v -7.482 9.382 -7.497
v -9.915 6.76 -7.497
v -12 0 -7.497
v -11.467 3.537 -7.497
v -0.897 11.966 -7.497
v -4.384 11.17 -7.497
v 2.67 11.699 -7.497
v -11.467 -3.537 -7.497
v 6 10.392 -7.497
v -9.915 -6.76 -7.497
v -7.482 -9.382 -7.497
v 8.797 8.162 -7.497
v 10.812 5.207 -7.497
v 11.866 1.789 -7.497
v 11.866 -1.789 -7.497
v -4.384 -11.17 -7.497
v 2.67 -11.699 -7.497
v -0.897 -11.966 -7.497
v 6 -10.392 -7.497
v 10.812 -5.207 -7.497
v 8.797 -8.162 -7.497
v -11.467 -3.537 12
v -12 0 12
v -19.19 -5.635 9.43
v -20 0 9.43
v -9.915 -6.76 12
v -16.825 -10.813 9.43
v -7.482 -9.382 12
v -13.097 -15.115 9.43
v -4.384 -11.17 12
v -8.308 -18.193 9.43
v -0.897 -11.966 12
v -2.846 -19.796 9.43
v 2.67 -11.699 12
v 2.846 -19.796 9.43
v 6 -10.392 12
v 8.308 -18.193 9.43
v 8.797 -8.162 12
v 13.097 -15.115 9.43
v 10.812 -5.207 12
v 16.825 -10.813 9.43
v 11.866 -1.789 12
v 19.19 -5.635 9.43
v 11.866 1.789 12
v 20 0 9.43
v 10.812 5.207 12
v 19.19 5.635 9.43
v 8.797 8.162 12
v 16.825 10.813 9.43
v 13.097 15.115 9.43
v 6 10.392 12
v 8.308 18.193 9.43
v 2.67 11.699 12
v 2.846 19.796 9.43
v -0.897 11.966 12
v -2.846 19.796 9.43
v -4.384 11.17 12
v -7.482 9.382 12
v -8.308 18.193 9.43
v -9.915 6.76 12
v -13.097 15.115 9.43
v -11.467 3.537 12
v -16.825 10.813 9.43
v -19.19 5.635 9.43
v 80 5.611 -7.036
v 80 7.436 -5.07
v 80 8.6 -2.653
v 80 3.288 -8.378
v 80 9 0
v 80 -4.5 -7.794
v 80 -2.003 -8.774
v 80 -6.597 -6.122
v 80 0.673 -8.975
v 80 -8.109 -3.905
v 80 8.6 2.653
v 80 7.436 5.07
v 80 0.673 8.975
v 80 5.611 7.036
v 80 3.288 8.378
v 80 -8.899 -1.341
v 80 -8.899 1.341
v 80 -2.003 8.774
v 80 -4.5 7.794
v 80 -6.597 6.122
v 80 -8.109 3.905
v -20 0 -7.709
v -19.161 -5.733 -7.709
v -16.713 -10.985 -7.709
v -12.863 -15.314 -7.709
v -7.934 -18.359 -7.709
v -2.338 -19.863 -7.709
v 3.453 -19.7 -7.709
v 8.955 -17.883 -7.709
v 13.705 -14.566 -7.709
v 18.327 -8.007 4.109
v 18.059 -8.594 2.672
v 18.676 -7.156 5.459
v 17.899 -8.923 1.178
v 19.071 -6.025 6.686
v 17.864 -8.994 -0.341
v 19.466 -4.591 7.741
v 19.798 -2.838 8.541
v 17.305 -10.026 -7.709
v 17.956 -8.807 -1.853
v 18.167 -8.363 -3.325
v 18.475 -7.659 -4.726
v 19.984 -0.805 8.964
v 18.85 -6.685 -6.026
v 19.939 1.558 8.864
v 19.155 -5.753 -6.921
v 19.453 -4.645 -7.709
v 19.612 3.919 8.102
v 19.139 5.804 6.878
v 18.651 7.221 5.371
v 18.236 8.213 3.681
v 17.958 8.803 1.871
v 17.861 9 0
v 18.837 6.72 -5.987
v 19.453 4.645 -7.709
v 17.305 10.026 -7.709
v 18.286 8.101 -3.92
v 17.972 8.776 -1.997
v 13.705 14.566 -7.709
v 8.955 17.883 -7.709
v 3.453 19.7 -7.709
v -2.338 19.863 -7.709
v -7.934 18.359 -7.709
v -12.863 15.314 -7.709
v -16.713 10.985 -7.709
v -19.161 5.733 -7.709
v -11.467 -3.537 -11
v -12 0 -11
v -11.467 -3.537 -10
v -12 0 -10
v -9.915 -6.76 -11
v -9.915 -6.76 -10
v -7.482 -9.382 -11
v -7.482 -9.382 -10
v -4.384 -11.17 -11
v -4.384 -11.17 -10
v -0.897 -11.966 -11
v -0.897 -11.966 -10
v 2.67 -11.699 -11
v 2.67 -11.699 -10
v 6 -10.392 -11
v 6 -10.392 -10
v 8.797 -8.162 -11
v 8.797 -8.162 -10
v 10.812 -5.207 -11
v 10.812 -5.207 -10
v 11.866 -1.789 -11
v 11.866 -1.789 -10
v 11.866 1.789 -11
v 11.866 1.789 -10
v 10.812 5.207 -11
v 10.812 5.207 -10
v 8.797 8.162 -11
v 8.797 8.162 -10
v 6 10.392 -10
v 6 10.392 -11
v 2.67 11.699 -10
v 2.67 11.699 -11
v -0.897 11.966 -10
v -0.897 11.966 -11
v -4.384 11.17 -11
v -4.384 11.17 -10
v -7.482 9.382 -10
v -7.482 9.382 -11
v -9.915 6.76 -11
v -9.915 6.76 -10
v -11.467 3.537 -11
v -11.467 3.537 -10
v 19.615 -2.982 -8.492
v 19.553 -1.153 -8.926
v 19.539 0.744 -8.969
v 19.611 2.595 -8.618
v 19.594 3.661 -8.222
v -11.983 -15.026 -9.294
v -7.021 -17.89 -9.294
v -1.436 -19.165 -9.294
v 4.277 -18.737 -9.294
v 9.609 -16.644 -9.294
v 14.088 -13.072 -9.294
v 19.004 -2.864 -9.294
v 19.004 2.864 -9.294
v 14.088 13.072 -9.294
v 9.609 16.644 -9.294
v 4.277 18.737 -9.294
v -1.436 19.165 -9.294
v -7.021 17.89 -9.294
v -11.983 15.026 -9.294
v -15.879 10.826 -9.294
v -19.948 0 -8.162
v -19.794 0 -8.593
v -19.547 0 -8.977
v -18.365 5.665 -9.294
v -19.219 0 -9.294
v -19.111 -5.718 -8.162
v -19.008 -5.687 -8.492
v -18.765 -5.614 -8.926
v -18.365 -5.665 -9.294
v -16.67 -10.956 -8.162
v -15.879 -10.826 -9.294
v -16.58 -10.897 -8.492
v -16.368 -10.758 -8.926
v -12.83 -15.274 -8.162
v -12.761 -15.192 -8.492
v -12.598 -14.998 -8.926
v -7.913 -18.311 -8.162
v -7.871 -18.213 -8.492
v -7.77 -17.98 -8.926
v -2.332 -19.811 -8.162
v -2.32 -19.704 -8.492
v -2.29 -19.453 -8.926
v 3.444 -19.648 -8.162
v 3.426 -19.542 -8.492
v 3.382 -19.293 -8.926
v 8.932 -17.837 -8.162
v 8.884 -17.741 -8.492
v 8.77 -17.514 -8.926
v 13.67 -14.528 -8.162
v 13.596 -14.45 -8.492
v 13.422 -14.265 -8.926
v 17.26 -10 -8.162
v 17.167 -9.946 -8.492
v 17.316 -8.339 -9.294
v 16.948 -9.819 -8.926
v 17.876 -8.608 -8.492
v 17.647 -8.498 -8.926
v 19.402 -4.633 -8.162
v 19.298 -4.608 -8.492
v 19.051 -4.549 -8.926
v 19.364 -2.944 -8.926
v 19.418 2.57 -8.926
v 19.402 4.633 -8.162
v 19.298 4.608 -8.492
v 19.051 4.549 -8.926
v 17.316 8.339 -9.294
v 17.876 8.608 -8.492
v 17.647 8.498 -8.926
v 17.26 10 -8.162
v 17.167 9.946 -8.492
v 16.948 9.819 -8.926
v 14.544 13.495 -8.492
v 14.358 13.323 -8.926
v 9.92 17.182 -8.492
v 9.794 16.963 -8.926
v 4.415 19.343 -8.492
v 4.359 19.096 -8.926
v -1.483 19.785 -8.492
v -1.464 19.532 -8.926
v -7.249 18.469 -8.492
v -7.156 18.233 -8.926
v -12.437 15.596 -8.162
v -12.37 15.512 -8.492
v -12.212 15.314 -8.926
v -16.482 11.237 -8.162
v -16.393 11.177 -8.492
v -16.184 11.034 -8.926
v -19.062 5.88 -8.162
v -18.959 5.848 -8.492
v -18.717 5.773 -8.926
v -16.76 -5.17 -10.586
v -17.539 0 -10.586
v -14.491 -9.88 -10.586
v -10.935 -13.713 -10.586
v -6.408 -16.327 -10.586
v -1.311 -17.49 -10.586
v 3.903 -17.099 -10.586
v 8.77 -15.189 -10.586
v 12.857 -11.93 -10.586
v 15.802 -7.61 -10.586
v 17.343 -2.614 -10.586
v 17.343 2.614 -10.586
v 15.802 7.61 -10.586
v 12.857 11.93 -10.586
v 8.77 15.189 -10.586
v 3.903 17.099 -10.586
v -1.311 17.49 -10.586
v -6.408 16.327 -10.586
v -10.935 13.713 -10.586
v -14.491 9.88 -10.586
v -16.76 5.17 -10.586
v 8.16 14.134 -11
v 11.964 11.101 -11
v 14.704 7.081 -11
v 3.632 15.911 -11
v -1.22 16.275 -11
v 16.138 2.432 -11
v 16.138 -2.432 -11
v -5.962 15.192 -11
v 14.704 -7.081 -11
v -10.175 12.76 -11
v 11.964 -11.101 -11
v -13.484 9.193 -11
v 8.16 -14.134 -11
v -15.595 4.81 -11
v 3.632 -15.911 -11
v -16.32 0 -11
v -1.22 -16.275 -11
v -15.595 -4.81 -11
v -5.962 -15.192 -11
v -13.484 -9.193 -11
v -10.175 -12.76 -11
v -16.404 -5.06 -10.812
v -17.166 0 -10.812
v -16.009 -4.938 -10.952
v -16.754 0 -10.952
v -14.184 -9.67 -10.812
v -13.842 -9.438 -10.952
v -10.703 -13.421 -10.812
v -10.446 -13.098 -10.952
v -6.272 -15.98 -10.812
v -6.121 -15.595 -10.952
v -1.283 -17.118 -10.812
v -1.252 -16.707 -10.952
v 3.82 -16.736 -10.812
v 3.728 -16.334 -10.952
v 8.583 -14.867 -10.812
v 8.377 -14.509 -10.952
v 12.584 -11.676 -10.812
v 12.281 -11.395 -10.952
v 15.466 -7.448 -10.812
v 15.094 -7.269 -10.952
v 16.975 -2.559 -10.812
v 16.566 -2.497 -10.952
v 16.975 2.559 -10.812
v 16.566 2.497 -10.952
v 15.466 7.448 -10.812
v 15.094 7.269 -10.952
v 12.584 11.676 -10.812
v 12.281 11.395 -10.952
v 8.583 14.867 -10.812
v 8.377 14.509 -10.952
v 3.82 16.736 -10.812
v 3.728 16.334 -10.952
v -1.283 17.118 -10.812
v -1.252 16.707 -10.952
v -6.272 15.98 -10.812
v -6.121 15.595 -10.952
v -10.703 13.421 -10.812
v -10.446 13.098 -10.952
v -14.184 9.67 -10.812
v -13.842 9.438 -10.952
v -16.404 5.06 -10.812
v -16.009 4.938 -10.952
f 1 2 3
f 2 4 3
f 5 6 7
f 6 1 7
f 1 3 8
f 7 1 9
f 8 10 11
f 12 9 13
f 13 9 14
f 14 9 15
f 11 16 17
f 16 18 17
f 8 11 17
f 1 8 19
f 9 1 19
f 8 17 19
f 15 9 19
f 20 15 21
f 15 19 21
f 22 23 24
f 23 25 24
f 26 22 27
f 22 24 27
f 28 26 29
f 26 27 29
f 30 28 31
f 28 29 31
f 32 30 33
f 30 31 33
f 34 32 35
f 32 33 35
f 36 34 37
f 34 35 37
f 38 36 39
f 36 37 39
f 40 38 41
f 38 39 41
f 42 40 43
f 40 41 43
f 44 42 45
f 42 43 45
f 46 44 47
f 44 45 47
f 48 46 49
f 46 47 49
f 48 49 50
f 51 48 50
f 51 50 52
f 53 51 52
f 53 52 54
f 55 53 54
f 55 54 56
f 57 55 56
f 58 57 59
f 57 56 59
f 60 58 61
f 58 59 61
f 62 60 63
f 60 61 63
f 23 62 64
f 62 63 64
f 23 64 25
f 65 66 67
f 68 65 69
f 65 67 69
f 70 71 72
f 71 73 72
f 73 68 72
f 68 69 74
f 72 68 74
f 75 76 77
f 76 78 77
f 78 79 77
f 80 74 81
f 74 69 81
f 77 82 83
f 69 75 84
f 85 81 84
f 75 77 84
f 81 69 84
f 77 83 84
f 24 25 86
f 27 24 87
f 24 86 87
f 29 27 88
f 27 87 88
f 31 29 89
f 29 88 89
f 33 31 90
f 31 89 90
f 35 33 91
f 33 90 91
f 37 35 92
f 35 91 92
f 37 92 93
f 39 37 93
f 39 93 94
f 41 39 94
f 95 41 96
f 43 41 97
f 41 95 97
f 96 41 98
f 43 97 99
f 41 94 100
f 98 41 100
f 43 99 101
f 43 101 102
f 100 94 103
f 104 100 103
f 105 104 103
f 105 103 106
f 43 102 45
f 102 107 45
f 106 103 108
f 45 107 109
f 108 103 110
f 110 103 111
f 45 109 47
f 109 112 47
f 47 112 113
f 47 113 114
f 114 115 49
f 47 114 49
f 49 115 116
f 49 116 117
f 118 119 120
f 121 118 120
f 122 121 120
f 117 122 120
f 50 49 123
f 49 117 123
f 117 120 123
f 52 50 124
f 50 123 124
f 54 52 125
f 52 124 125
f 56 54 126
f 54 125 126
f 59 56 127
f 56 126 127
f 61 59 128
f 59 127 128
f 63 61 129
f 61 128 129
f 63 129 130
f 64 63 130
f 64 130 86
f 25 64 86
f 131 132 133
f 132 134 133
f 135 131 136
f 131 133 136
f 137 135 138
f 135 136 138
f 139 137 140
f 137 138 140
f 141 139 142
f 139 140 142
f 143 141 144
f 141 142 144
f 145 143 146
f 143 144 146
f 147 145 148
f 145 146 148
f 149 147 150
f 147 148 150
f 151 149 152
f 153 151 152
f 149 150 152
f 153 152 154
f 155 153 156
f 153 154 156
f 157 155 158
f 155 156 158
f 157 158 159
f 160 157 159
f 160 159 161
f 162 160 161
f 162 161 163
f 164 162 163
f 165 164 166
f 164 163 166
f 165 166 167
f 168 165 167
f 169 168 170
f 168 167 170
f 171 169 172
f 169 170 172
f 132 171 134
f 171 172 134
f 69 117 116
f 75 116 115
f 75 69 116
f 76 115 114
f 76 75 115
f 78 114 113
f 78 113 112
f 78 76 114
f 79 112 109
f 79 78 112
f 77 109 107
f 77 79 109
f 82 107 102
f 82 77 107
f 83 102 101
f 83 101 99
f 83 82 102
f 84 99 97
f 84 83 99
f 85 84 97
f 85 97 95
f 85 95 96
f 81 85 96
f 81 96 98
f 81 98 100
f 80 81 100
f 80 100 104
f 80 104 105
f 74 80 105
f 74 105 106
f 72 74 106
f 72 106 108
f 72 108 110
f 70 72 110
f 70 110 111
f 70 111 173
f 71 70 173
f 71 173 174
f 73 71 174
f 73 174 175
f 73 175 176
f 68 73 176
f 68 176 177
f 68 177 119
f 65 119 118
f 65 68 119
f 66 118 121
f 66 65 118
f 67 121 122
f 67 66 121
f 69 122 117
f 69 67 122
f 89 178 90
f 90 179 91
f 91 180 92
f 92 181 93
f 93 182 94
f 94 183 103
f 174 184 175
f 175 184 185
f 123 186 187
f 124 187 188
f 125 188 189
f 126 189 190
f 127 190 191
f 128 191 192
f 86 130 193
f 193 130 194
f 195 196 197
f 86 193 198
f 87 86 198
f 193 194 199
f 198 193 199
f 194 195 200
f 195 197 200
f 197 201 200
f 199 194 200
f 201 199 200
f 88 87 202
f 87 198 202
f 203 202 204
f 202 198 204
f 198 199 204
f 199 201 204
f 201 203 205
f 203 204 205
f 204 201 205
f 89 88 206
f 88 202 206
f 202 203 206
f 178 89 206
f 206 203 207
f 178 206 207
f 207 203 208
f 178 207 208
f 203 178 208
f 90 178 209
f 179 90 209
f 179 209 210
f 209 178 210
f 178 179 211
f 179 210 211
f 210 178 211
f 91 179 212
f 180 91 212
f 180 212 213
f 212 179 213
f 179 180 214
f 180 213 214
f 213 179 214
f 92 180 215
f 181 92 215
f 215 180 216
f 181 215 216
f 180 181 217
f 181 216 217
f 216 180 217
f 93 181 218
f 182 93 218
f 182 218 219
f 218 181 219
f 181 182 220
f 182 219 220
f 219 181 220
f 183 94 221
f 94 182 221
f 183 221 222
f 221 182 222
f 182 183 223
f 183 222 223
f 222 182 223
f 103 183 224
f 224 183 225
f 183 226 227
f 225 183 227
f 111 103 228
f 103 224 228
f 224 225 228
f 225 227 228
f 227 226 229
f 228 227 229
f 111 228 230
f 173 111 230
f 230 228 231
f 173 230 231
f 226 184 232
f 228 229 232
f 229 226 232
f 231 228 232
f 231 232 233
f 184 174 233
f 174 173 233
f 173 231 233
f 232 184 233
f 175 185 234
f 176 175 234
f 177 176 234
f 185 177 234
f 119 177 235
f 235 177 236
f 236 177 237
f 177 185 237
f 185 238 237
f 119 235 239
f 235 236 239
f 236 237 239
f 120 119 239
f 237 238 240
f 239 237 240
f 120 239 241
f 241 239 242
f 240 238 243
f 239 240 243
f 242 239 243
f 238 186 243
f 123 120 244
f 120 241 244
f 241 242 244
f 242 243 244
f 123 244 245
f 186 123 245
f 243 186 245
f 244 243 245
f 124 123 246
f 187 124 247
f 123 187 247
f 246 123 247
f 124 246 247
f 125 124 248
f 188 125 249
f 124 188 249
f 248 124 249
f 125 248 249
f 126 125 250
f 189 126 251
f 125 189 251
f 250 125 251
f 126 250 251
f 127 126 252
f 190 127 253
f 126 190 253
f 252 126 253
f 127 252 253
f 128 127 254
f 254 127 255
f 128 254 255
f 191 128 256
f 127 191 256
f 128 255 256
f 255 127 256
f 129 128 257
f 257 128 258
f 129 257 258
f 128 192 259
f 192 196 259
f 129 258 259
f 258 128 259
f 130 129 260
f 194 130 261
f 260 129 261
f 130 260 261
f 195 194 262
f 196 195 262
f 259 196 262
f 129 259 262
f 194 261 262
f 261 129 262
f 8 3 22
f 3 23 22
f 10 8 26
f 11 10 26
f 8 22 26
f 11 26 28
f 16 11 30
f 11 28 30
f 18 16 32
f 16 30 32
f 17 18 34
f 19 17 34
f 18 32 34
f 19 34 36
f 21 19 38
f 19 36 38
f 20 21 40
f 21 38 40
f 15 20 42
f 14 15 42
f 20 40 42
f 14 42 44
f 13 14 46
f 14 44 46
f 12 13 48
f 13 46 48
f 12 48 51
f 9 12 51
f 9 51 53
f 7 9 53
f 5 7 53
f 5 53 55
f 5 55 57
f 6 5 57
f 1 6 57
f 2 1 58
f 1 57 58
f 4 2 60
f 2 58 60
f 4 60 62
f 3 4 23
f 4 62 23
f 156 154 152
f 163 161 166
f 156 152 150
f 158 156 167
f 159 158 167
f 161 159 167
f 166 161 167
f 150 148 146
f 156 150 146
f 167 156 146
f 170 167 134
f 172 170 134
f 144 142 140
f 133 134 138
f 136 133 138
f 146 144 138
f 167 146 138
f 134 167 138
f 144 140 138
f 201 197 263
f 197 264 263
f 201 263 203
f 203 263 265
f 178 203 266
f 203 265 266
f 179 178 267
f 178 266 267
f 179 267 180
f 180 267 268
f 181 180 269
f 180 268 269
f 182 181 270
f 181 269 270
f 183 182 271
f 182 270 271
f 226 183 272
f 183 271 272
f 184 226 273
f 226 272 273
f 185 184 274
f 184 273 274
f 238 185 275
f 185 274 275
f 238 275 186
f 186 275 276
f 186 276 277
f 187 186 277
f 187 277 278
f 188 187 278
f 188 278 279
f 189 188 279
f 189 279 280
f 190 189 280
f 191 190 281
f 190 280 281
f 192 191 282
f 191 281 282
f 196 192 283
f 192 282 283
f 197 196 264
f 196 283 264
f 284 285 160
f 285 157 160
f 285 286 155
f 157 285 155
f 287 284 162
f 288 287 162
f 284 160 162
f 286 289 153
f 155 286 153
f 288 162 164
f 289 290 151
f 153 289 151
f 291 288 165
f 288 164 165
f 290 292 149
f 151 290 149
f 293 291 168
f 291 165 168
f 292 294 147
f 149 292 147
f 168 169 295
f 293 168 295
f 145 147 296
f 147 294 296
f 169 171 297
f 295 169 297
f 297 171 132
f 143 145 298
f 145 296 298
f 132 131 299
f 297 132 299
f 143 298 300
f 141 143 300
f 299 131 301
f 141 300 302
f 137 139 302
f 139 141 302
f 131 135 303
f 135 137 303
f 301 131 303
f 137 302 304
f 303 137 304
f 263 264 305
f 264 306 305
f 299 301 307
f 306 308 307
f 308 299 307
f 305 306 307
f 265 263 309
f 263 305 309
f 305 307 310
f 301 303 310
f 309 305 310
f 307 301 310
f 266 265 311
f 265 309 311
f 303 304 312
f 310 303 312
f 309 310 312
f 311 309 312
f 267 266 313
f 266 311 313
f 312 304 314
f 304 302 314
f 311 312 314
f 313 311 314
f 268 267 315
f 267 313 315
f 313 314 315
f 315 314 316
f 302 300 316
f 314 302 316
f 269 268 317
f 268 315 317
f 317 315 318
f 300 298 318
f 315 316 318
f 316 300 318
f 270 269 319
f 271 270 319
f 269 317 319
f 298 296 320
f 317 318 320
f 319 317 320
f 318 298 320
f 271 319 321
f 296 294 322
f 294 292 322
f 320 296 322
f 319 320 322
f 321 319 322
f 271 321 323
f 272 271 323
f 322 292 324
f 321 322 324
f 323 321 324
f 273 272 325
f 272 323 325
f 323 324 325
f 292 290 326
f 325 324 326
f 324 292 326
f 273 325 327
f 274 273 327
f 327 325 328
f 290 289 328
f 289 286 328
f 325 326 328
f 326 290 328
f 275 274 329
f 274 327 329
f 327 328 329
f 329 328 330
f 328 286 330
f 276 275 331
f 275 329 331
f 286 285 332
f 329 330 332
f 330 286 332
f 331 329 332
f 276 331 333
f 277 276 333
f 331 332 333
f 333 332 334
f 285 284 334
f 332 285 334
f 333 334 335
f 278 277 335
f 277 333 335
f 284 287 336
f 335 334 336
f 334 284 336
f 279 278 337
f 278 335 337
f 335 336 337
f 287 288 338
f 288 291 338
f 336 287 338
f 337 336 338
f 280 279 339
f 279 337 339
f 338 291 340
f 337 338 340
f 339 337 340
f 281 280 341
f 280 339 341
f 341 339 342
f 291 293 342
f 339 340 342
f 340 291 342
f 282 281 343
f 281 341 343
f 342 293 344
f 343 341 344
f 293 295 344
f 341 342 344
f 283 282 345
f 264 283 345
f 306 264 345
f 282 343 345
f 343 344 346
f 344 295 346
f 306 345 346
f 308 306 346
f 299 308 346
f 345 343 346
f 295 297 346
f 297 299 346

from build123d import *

# Parameters (mm, degrees)
F_3DSKETCH1_R       = 9
BOSS_EXTRUDE3_DEPTH = 65


with BuildPart() as part:
    # Sketch2 → Revolve1 (revolve)
    with BuildSketch(Plane(origin=(0, 0, 0), x_dir=(1, 0, 0), z_dir=(0, 1, 0))):
        with BuildLine():
            Line((12, -12), (20, -9.430177972))
            Line((20, -9.430177972), (20, 7.708755689))
            ThreePointArc((20, 7.708755689), (19.794118127, 8.59257702), (19.218859855, 9.29443556))
            Line((19.218859855, 9.29443556), (17.53901118, 10.585679871))
            ThreePointArc((17.53901118, 10.585679871), (16.963828362, 10.893589151), (16.320151325, 11))
            Line((16.320151325, 11), (12, 11))
            Line((12, 11), (12, 10))
            Line((12, 10), (0, 10))
            Line((0, 10), (0, 7.49732498))
            Line((0, 7.49732498), (12, 7.49732498))
            Line((12, 7.49732498), (12, -12))
        make_face()
    revolve(axis=Axis((0, 0, -10), (0, 0, 1)))

    # 3DSketch1 → Boss-Extrude3 (add)
    with BuildSketch(Plane(origin=(80, 0, 0), x_dir=(0, 0, 1), z_dir=(1, 0, 0))):
        Circle(F_3DSKETCH1_R)
    extrude(amount=-BOSS_EXTRUDE3_DEPTH)


solid = part.part
